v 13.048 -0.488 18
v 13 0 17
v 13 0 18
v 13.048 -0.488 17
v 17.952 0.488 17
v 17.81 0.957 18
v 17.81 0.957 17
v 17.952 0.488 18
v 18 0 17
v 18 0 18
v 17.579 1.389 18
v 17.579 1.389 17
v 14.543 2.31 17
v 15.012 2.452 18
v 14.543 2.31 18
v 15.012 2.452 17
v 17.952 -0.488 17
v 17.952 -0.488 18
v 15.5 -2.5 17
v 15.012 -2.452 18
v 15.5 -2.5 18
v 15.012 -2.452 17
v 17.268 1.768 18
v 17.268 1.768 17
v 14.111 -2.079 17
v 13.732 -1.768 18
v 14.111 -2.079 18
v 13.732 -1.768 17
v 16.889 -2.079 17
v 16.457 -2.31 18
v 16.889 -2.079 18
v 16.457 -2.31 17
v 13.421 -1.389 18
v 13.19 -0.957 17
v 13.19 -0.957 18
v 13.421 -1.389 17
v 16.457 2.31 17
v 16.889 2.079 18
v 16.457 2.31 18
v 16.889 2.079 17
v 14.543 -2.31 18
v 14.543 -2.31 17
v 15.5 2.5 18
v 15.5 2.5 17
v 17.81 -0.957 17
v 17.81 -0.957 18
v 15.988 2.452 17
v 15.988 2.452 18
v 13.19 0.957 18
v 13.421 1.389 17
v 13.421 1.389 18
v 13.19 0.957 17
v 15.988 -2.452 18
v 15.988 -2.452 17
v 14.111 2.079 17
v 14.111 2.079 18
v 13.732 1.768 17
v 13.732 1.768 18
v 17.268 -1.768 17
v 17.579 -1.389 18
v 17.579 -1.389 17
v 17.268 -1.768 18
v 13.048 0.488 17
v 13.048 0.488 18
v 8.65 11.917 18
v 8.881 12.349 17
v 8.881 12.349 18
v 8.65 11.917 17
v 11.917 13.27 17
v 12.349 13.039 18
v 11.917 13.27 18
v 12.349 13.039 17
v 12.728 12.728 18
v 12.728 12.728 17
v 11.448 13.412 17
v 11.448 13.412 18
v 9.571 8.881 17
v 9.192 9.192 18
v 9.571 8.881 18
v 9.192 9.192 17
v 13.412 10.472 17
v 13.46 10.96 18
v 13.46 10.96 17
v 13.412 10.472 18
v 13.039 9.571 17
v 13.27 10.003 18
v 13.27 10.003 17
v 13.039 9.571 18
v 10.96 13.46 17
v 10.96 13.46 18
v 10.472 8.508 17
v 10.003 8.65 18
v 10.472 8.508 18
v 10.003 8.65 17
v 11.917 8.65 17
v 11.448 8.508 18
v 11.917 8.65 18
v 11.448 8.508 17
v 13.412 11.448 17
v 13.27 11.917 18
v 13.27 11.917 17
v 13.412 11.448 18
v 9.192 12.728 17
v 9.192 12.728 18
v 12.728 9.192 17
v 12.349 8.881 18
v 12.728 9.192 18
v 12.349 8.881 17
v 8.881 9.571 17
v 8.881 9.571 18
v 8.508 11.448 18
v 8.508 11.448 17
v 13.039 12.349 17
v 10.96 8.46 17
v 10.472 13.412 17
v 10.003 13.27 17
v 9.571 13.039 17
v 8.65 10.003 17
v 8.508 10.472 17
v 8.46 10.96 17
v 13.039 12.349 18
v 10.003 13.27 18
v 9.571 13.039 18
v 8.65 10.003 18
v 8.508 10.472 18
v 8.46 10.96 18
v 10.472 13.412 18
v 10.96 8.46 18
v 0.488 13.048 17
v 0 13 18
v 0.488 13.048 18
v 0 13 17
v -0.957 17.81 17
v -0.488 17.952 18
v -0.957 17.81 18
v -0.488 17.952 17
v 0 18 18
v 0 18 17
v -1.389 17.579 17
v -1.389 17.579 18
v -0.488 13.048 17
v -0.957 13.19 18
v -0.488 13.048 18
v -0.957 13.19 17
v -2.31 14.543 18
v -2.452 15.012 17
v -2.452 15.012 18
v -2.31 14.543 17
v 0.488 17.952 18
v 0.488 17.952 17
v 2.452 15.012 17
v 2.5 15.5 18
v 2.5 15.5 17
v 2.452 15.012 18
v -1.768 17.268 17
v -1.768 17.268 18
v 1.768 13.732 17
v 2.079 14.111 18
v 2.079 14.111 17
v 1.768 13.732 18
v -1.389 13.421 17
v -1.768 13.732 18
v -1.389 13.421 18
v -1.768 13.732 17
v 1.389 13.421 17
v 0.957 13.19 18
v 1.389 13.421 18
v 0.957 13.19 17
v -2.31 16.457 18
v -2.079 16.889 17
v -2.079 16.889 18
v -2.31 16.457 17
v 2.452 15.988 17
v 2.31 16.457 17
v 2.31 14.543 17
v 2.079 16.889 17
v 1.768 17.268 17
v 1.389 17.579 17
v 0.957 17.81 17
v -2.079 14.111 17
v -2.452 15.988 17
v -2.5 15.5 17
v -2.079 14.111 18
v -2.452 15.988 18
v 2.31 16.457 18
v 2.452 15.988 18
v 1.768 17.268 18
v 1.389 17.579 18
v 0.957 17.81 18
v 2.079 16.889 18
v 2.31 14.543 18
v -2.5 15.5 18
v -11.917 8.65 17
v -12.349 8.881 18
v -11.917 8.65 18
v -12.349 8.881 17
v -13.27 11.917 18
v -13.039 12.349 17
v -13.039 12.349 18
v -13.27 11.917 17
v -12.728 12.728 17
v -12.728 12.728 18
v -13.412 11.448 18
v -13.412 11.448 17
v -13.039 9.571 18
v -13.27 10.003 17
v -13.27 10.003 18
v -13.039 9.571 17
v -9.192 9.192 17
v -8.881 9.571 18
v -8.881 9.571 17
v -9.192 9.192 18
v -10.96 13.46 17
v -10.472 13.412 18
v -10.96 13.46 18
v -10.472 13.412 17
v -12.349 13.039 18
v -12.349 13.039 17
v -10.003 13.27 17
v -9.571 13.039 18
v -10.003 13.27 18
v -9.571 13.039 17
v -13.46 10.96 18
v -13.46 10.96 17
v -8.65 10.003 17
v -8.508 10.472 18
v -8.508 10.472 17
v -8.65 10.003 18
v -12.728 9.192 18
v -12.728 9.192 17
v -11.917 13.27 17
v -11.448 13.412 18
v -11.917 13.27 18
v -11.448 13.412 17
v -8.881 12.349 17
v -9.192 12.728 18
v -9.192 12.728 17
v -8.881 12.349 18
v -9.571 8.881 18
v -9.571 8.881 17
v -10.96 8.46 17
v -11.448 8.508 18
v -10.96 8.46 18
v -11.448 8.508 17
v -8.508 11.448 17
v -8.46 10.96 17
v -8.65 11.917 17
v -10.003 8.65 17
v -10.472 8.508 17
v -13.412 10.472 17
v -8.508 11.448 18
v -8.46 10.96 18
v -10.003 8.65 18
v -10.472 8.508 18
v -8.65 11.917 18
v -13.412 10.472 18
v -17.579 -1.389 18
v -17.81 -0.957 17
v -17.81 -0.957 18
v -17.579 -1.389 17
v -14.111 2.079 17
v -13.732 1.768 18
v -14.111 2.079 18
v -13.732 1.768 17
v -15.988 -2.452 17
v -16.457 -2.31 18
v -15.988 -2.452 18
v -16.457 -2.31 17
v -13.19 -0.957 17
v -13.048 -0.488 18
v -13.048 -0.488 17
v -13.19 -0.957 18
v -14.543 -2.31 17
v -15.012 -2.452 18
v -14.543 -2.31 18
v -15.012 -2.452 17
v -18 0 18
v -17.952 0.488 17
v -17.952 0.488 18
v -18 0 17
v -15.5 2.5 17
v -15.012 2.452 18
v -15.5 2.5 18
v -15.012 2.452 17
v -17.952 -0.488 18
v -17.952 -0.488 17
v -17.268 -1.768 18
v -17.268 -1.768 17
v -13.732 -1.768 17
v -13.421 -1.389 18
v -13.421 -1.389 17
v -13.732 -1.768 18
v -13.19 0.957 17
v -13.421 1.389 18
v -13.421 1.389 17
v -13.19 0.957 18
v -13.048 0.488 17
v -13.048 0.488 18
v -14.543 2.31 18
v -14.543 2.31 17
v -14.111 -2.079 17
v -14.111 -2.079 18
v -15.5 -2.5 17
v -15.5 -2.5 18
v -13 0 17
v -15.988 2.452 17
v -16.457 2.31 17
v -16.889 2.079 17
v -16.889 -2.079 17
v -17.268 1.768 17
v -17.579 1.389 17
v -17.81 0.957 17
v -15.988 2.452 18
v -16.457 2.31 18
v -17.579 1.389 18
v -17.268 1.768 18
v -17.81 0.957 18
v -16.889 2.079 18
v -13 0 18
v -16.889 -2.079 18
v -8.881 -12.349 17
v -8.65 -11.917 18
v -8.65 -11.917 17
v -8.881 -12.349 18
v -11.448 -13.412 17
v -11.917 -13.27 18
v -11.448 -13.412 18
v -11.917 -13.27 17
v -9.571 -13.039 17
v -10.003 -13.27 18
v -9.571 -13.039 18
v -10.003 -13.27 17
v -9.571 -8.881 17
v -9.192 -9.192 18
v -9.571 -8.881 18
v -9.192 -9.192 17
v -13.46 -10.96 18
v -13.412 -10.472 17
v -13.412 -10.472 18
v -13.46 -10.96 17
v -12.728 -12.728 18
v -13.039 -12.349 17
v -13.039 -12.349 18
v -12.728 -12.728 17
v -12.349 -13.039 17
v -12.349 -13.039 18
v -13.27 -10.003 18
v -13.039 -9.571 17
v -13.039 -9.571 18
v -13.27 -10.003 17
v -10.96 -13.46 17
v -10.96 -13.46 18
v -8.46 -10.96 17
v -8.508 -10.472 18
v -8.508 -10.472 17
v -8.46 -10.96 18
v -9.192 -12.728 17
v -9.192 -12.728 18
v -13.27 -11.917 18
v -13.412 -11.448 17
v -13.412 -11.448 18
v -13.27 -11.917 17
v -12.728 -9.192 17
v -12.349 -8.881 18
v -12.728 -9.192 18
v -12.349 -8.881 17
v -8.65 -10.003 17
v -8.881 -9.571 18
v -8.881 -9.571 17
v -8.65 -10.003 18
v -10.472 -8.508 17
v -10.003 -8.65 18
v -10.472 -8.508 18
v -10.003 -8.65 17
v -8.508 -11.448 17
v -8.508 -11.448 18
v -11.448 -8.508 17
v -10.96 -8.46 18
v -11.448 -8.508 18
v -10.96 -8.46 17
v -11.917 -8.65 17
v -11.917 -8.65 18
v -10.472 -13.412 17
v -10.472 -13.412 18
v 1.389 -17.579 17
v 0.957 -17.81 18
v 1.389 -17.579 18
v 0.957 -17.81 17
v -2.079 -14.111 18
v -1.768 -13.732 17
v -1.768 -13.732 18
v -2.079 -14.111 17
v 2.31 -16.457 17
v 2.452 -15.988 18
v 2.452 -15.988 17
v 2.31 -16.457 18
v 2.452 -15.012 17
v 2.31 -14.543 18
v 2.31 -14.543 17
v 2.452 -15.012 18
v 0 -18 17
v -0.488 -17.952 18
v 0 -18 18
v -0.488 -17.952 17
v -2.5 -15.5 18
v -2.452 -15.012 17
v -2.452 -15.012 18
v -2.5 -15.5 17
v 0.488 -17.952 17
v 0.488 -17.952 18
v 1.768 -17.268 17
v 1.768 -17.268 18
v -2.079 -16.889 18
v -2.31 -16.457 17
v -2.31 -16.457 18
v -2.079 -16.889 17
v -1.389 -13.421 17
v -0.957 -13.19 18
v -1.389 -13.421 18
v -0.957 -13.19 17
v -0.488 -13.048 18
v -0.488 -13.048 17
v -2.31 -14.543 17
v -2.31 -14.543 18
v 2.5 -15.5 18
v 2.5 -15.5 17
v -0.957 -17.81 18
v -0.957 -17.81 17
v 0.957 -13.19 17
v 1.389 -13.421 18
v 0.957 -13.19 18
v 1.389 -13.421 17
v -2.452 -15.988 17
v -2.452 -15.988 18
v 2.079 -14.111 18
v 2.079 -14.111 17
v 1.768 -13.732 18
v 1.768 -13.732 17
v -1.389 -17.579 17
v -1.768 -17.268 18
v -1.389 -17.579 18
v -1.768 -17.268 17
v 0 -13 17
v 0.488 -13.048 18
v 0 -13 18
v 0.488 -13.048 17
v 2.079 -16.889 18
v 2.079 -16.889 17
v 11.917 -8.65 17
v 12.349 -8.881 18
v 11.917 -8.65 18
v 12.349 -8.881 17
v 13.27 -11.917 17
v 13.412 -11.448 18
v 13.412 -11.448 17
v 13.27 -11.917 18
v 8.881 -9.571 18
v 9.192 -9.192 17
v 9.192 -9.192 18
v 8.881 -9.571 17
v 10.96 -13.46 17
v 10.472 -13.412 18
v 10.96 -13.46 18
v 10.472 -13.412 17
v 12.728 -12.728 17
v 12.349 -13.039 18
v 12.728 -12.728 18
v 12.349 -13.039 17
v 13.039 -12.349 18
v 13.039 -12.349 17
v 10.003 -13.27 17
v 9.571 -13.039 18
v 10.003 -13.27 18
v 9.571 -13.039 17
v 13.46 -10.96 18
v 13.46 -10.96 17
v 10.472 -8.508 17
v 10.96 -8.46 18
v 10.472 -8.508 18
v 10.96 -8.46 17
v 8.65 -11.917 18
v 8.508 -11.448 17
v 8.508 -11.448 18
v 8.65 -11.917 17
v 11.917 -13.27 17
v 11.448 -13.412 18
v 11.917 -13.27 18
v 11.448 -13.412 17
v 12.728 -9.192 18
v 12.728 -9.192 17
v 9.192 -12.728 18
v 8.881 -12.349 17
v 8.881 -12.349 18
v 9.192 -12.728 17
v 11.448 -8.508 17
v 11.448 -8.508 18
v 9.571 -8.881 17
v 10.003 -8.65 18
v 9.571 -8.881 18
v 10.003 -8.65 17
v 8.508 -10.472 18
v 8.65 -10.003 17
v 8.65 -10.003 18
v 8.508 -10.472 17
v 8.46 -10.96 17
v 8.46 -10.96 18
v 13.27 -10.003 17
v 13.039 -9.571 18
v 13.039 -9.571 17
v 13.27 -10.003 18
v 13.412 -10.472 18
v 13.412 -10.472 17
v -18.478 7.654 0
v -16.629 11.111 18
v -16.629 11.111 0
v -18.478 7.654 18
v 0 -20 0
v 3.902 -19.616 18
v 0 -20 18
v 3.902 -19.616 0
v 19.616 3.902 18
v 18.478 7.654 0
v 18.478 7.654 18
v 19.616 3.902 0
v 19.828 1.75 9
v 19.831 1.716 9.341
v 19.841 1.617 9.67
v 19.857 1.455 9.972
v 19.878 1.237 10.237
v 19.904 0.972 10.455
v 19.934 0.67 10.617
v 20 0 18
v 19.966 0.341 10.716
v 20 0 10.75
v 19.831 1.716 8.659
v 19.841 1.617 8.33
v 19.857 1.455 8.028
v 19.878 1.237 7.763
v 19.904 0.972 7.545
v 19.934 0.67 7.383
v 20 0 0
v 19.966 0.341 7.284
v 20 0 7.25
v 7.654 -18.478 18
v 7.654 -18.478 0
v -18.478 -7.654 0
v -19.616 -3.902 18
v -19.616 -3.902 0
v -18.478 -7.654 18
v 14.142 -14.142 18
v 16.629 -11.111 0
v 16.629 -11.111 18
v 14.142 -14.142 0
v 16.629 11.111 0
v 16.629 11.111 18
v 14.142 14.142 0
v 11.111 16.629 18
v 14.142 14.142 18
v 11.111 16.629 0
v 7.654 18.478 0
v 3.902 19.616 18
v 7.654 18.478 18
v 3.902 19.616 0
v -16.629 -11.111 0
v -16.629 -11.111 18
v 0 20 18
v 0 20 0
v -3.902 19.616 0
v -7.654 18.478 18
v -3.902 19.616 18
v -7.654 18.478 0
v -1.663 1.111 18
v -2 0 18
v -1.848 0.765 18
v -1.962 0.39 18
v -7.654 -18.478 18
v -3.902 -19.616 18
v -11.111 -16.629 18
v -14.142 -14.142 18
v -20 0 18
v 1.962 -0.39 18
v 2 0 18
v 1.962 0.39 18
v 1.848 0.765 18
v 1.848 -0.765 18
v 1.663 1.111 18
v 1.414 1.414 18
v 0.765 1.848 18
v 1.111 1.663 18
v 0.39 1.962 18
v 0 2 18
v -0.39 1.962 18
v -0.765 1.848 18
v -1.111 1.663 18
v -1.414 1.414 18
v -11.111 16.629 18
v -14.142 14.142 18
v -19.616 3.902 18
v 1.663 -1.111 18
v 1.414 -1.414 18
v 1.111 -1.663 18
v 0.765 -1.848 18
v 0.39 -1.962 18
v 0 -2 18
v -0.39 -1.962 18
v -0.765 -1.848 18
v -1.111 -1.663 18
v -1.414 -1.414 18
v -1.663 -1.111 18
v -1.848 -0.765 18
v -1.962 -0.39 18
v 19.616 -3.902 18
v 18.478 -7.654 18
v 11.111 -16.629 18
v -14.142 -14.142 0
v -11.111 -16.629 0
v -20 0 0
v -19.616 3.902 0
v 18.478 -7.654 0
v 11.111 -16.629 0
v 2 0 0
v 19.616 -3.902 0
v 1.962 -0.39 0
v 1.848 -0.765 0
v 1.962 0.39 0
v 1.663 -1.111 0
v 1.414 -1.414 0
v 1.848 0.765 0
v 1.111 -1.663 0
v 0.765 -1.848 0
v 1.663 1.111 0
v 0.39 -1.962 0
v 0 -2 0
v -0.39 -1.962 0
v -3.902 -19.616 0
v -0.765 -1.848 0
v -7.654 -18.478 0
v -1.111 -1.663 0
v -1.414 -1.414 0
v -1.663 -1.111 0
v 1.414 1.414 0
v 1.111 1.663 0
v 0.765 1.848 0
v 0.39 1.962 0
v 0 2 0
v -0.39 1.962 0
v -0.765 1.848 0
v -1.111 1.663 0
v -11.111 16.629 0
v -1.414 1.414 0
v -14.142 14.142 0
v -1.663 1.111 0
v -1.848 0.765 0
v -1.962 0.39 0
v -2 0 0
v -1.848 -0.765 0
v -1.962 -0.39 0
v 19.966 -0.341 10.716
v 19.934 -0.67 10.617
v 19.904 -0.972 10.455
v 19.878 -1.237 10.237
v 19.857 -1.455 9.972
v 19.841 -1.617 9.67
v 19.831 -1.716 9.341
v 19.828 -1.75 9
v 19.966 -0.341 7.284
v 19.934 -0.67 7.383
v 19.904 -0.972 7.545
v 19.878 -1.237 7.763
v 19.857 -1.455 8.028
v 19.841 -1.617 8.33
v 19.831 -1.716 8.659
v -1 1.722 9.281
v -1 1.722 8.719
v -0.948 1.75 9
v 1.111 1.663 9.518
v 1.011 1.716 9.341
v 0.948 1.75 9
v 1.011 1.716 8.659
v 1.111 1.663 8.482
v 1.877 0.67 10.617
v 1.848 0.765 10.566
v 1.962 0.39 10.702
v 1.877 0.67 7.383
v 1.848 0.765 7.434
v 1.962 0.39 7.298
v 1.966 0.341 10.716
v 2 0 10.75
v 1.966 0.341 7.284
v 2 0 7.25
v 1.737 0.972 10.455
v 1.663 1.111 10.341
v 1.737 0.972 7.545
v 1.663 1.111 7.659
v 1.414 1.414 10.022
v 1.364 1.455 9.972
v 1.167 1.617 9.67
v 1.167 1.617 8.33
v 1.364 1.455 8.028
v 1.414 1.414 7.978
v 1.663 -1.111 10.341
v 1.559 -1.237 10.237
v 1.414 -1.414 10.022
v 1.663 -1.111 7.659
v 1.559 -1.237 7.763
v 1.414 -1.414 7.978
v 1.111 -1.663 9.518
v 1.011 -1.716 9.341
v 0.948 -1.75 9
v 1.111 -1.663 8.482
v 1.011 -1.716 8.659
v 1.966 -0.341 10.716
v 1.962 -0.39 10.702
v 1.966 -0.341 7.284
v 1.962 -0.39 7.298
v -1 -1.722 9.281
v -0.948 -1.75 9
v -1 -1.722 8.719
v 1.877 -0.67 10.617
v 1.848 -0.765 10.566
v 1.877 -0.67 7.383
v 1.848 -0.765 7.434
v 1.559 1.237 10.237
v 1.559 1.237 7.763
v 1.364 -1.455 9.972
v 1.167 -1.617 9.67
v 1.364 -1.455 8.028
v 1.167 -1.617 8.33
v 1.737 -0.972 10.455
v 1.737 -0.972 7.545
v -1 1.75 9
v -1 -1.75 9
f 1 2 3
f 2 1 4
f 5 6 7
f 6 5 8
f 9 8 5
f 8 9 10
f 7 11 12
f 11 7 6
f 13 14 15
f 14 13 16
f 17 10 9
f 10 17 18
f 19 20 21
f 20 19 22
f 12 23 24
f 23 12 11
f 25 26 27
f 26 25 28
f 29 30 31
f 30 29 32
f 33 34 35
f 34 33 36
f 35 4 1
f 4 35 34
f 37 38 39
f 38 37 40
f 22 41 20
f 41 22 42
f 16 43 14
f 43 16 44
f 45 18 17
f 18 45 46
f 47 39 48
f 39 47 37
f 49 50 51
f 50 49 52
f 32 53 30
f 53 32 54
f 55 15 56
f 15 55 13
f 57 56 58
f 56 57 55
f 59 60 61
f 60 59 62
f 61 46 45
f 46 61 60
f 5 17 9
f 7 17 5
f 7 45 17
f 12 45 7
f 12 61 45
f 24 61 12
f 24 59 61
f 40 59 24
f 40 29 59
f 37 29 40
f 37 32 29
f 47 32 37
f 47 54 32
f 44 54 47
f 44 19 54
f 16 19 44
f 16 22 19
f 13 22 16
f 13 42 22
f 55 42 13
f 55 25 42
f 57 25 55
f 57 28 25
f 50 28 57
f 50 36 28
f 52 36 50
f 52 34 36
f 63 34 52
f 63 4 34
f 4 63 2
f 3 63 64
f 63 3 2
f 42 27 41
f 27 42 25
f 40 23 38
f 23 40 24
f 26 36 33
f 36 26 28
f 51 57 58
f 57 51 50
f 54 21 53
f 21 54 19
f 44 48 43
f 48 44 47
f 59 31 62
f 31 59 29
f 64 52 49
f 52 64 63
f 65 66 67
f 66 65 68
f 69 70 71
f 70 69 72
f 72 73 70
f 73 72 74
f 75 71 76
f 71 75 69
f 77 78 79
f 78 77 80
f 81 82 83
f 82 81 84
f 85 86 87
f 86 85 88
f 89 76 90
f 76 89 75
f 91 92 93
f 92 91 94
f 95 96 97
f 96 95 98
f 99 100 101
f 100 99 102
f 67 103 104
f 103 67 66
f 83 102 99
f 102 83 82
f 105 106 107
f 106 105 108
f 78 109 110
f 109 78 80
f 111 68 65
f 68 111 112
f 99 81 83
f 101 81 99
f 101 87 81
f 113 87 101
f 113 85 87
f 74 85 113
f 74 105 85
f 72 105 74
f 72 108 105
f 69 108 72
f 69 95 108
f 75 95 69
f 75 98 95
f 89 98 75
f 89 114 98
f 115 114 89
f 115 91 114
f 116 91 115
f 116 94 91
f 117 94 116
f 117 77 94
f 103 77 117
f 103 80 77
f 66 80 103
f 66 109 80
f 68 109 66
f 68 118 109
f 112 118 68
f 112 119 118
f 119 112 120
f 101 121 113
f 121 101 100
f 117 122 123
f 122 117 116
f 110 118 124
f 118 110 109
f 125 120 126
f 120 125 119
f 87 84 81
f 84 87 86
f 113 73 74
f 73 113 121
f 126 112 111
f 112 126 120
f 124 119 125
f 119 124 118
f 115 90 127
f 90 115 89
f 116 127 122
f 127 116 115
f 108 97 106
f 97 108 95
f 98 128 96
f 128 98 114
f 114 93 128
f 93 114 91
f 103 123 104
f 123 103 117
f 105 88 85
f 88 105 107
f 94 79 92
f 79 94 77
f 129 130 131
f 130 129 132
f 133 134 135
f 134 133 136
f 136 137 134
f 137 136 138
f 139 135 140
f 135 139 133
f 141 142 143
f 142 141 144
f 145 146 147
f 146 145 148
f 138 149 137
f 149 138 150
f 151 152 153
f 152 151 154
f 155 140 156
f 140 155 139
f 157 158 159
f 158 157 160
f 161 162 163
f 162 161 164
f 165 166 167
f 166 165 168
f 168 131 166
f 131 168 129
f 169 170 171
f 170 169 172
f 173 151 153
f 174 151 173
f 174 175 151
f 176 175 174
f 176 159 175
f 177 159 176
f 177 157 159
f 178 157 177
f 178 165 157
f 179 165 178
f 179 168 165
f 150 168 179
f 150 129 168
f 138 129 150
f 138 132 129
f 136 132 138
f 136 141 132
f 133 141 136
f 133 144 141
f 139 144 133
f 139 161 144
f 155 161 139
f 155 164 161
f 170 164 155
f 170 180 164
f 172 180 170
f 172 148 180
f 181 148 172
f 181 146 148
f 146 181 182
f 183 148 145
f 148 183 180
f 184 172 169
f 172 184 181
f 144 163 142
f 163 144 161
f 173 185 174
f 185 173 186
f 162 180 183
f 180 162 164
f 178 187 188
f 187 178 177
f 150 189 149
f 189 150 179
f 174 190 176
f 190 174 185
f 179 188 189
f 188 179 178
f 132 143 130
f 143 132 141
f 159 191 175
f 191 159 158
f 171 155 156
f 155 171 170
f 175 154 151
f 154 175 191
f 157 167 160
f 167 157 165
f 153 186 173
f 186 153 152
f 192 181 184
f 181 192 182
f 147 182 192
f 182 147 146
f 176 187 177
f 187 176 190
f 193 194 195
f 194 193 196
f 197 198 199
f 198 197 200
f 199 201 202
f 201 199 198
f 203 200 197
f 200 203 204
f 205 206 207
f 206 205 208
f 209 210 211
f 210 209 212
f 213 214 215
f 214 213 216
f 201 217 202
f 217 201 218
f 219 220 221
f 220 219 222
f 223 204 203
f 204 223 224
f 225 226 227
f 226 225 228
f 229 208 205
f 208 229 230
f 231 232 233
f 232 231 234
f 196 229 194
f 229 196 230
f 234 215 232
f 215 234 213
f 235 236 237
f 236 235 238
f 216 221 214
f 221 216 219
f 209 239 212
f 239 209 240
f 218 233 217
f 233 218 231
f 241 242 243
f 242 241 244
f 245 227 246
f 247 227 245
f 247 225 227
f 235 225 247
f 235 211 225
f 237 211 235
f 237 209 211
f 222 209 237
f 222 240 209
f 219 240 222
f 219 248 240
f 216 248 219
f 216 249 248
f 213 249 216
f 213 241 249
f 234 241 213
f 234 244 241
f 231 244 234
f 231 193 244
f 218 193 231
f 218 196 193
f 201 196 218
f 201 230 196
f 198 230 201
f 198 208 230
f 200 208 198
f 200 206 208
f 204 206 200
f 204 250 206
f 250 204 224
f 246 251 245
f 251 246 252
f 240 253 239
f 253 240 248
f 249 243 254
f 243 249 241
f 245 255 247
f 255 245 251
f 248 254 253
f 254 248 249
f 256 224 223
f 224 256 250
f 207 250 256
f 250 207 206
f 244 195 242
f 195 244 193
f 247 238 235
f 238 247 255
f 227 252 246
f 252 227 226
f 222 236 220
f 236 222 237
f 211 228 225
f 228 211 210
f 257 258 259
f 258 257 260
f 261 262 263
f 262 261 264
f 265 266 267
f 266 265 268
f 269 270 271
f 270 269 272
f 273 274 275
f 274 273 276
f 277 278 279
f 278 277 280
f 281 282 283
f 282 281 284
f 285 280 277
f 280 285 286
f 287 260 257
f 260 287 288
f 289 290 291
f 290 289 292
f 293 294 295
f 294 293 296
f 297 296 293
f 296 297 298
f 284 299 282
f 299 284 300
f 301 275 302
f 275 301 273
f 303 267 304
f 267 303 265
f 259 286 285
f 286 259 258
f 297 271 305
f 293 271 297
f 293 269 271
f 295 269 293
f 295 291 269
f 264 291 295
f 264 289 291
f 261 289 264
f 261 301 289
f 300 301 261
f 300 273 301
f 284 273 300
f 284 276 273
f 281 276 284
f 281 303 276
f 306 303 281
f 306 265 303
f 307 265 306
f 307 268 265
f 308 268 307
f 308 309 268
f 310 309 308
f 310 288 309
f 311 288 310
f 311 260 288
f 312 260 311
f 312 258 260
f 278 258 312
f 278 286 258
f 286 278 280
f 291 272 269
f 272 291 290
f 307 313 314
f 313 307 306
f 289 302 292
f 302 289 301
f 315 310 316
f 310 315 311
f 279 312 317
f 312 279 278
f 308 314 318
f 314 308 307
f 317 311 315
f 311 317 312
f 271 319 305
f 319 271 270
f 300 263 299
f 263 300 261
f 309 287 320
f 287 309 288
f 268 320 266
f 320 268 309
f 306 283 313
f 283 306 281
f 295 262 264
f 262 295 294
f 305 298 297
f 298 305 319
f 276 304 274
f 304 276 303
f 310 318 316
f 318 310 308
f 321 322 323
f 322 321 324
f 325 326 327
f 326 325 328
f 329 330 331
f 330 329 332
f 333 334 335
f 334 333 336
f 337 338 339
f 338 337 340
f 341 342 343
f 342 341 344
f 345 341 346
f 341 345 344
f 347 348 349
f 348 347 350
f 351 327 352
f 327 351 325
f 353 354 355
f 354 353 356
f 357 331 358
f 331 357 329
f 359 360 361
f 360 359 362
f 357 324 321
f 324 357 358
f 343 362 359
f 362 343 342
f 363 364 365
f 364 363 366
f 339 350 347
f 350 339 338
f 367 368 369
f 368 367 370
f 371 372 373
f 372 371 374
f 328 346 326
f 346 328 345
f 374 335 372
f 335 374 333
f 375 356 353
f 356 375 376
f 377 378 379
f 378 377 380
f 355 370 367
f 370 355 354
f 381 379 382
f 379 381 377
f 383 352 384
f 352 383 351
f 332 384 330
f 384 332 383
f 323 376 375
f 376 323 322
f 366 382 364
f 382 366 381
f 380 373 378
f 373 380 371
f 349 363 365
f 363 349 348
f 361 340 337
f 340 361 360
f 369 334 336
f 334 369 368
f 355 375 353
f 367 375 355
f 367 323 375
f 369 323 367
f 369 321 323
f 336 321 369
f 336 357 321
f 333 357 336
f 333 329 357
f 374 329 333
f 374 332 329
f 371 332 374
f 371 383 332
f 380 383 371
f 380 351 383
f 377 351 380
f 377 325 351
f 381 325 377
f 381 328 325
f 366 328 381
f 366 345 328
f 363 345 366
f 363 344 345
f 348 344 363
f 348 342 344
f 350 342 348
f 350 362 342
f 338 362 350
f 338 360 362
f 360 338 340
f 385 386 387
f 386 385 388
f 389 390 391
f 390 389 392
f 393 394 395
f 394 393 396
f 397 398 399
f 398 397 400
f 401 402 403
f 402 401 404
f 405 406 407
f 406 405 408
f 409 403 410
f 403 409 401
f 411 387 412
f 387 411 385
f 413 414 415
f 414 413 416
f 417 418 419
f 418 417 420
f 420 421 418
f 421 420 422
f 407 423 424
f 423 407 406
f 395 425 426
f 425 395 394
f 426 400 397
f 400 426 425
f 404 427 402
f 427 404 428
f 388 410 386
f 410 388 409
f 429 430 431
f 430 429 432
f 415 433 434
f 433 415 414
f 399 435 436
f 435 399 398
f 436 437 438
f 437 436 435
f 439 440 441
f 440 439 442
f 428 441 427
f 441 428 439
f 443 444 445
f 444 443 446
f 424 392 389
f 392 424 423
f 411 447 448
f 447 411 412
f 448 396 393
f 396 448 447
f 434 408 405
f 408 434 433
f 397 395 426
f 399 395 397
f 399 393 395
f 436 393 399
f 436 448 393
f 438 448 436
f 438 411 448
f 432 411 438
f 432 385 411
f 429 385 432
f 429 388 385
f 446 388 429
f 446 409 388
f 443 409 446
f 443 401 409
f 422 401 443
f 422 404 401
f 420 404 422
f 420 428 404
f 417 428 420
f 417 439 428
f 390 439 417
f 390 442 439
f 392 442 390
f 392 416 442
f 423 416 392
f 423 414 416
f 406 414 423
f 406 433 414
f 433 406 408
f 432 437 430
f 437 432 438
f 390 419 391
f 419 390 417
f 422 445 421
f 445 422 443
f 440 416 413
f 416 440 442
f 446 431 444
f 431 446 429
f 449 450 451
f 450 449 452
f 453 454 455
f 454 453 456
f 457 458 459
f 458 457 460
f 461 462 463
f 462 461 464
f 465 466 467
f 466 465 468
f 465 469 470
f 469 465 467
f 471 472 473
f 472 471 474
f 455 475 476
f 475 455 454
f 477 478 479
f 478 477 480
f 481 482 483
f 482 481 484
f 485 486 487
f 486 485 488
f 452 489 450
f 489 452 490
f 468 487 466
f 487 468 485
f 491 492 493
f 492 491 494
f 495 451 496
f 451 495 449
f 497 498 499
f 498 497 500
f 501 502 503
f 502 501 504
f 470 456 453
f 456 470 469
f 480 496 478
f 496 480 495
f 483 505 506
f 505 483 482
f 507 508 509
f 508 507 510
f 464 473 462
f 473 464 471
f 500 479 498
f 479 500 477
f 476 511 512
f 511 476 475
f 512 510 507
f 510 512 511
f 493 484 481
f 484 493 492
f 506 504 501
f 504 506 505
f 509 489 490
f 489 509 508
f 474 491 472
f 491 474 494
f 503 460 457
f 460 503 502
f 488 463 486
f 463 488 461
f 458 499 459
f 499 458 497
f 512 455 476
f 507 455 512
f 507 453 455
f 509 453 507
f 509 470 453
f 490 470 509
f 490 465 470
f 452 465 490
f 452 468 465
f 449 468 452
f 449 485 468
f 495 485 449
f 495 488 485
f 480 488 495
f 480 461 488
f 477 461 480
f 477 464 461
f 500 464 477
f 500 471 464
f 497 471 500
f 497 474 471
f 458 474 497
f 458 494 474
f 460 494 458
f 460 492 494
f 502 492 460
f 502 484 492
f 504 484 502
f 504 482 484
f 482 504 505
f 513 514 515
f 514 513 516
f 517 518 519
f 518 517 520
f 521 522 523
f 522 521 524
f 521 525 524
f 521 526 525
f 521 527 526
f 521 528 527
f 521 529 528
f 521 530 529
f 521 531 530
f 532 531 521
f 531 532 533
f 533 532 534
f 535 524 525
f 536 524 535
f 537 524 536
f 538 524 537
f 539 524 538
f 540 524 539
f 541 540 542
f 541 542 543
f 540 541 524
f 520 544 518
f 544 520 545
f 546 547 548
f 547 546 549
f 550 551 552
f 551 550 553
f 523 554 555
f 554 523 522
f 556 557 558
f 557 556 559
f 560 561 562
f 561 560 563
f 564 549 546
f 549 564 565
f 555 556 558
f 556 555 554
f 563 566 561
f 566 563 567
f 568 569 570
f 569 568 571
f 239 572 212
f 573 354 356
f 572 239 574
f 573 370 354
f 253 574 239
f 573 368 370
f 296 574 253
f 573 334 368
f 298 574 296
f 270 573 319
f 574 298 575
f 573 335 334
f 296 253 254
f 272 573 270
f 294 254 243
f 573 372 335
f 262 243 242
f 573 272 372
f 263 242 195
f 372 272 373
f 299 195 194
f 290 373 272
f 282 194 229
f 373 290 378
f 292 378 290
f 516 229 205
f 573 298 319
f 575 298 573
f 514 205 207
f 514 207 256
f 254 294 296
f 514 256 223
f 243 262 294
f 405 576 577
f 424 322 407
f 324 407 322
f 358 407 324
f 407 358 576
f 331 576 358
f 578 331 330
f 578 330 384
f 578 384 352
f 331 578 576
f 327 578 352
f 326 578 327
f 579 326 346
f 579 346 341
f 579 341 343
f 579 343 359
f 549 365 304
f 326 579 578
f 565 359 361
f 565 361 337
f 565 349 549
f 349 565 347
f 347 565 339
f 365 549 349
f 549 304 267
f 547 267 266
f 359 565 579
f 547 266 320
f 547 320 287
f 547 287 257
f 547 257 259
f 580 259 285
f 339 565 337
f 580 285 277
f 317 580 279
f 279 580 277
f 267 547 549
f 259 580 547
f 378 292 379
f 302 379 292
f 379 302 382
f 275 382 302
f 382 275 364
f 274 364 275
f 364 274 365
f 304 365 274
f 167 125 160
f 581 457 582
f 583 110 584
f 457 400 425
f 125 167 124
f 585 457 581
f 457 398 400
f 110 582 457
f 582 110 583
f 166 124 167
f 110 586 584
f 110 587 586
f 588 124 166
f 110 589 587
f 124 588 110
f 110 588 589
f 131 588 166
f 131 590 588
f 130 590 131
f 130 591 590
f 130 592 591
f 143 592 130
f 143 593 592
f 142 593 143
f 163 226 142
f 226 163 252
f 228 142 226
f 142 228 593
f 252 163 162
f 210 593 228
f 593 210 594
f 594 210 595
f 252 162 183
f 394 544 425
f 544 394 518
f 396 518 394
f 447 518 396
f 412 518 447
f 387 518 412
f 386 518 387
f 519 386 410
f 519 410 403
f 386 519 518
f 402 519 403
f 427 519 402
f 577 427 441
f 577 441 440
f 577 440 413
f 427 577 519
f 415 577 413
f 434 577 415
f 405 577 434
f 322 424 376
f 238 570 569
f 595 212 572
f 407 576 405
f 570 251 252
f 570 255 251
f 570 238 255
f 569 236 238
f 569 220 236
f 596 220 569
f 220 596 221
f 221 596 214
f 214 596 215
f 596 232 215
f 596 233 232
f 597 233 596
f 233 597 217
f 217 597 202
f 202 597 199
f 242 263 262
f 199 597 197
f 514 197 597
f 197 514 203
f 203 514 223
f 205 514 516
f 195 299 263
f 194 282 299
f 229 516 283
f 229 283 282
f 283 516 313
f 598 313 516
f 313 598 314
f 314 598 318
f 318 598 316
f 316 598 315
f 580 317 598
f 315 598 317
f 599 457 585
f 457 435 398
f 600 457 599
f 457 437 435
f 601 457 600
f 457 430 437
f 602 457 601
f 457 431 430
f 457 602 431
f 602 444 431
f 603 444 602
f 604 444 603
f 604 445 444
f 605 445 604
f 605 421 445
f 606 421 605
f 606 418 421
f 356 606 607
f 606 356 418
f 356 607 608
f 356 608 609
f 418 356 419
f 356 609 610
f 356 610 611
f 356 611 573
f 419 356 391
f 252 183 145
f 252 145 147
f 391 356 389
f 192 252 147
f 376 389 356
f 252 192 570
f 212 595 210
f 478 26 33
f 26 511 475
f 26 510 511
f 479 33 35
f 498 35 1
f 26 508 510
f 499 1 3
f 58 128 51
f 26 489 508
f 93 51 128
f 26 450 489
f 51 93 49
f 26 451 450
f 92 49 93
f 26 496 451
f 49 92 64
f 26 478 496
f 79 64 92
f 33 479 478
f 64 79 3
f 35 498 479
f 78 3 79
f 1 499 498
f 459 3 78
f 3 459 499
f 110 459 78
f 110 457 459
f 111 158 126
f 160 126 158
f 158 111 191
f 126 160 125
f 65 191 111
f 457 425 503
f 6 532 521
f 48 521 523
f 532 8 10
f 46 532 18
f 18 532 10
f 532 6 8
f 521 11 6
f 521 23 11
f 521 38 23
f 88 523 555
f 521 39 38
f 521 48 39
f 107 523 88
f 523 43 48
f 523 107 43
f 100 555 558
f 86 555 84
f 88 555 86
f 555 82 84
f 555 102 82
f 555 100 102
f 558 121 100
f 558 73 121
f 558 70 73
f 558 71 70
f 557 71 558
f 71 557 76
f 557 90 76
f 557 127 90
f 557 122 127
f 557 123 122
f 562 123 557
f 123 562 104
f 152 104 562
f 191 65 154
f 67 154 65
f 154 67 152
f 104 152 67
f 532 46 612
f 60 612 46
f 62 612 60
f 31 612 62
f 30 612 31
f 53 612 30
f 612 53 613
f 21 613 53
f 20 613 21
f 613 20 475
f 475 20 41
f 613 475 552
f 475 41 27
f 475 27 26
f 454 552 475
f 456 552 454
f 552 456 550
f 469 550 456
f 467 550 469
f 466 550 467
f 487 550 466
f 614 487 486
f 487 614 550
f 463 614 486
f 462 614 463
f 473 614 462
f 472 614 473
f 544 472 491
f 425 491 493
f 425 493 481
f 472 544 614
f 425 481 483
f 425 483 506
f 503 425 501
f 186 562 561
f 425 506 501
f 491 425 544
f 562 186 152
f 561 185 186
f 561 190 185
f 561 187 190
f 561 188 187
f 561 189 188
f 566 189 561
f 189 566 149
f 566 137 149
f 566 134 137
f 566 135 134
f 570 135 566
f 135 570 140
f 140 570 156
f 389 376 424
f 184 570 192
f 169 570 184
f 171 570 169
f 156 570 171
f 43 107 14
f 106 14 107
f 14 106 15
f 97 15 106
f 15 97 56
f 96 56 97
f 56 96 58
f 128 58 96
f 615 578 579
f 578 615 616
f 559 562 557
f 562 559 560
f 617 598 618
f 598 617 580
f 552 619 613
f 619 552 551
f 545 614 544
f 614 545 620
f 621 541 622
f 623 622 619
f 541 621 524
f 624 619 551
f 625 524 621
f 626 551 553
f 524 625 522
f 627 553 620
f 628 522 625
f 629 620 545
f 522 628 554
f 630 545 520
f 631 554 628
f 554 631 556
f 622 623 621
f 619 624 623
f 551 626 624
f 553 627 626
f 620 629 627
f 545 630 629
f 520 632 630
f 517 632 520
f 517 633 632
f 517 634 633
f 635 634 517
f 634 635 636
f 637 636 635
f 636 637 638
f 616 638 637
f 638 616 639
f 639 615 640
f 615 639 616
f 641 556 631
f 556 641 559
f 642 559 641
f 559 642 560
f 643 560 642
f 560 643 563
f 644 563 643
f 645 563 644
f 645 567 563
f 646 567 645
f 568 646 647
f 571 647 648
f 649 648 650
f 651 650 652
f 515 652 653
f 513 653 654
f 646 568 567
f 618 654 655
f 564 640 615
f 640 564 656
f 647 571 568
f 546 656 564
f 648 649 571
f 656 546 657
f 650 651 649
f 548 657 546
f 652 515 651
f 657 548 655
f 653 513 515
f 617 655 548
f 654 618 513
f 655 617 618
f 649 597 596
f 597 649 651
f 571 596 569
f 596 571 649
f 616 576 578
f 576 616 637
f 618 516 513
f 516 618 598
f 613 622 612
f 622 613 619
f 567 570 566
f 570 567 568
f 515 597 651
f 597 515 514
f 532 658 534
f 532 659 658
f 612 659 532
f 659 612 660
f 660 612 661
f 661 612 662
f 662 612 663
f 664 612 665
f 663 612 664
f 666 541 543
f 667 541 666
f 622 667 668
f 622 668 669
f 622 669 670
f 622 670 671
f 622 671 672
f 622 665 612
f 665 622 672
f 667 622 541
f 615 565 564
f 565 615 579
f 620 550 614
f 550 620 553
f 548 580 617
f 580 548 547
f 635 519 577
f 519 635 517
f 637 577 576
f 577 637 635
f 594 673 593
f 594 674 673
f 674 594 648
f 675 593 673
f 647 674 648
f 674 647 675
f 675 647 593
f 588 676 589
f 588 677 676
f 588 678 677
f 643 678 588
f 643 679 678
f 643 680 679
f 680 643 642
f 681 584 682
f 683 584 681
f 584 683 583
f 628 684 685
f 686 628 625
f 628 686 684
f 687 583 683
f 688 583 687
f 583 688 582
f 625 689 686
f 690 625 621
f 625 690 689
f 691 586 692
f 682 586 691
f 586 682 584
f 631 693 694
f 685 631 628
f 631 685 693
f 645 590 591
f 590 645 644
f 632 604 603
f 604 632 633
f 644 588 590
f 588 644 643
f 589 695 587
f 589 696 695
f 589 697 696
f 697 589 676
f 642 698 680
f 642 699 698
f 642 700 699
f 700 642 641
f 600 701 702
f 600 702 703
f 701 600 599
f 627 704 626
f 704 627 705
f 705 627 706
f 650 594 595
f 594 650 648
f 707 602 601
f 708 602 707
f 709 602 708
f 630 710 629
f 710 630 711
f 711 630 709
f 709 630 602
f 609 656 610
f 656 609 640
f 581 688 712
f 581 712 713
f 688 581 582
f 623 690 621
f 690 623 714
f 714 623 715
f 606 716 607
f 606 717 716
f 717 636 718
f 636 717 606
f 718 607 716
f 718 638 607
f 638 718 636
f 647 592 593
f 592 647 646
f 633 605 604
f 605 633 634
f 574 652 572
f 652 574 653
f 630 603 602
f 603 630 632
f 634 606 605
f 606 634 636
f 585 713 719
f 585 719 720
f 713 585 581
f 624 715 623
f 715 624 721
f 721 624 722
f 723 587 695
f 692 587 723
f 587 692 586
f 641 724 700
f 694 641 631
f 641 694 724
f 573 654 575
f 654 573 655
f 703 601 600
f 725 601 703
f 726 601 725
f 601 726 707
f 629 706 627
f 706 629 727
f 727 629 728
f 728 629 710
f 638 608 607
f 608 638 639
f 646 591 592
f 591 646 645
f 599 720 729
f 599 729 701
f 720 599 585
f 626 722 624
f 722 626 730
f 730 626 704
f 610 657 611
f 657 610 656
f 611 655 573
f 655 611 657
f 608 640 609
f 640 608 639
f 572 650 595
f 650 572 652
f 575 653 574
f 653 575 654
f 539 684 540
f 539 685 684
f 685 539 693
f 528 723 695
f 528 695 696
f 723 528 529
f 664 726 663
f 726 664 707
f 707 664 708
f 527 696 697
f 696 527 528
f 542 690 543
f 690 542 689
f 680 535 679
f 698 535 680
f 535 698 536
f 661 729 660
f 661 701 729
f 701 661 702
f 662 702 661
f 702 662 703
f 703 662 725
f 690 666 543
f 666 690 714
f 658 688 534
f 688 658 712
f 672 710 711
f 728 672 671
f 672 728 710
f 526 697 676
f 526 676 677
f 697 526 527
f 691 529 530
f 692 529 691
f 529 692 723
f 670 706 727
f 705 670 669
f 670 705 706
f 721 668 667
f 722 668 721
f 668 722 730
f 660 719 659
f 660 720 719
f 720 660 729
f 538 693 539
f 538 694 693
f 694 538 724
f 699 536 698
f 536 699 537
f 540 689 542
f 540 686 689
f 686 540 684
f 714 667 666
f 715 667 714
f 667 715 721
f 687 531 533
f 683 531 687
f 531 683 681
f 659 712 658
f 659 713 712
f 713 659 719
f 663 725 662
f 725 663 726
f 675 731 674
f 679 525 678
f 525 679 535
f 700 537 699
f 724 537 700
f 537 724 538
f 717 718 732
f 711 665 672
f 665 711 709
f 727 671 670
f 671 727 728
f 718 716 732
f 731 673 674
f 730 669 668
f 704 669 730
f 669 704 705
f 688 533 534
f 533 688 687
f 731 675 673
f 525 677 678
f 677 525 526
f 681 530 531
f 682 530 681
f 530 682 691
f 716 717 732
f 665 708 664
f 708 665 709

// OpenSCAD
$fn = 32;

// ----------------------------------------------------------------------
// Control knob: dimpled knob
// ----------------------------------------------------------------------

// --- parameters (mm) ---
dimp_d = 5;               // finger dimple diameter
n_dimp = 8;               // number of dimples
dimp_r = 15.5;            // dimple ring radius
knob_d = 40;              // knob body diameter
knob_h = 18;              // knob body height
bore_d = 4;               // shaft bore diameter
set_d = 3.5;              // set screw bore diameter

dimp_step = 360 / n_dimp;  // dimple angular step

difference() {
  cylinder(h = knob_h, d = knob_d);
  translate([0, 0, -1]) cylinder(h = knob_h + 2, d = bore_d);
  translate([-1, 0, knob_h / 2]) rotate([0, 90, 0])
    cylinder(h = knob_d / 2 + bore_d / 2 + 2, d = set_d);  for (i = [0 : n_dimp - 1])
    rotate([0, 0, i * dimp_step])
      translate([dimp_r, 0, knob_h - 1])
        cylinder(h = 2, d = dimp_d);
}
